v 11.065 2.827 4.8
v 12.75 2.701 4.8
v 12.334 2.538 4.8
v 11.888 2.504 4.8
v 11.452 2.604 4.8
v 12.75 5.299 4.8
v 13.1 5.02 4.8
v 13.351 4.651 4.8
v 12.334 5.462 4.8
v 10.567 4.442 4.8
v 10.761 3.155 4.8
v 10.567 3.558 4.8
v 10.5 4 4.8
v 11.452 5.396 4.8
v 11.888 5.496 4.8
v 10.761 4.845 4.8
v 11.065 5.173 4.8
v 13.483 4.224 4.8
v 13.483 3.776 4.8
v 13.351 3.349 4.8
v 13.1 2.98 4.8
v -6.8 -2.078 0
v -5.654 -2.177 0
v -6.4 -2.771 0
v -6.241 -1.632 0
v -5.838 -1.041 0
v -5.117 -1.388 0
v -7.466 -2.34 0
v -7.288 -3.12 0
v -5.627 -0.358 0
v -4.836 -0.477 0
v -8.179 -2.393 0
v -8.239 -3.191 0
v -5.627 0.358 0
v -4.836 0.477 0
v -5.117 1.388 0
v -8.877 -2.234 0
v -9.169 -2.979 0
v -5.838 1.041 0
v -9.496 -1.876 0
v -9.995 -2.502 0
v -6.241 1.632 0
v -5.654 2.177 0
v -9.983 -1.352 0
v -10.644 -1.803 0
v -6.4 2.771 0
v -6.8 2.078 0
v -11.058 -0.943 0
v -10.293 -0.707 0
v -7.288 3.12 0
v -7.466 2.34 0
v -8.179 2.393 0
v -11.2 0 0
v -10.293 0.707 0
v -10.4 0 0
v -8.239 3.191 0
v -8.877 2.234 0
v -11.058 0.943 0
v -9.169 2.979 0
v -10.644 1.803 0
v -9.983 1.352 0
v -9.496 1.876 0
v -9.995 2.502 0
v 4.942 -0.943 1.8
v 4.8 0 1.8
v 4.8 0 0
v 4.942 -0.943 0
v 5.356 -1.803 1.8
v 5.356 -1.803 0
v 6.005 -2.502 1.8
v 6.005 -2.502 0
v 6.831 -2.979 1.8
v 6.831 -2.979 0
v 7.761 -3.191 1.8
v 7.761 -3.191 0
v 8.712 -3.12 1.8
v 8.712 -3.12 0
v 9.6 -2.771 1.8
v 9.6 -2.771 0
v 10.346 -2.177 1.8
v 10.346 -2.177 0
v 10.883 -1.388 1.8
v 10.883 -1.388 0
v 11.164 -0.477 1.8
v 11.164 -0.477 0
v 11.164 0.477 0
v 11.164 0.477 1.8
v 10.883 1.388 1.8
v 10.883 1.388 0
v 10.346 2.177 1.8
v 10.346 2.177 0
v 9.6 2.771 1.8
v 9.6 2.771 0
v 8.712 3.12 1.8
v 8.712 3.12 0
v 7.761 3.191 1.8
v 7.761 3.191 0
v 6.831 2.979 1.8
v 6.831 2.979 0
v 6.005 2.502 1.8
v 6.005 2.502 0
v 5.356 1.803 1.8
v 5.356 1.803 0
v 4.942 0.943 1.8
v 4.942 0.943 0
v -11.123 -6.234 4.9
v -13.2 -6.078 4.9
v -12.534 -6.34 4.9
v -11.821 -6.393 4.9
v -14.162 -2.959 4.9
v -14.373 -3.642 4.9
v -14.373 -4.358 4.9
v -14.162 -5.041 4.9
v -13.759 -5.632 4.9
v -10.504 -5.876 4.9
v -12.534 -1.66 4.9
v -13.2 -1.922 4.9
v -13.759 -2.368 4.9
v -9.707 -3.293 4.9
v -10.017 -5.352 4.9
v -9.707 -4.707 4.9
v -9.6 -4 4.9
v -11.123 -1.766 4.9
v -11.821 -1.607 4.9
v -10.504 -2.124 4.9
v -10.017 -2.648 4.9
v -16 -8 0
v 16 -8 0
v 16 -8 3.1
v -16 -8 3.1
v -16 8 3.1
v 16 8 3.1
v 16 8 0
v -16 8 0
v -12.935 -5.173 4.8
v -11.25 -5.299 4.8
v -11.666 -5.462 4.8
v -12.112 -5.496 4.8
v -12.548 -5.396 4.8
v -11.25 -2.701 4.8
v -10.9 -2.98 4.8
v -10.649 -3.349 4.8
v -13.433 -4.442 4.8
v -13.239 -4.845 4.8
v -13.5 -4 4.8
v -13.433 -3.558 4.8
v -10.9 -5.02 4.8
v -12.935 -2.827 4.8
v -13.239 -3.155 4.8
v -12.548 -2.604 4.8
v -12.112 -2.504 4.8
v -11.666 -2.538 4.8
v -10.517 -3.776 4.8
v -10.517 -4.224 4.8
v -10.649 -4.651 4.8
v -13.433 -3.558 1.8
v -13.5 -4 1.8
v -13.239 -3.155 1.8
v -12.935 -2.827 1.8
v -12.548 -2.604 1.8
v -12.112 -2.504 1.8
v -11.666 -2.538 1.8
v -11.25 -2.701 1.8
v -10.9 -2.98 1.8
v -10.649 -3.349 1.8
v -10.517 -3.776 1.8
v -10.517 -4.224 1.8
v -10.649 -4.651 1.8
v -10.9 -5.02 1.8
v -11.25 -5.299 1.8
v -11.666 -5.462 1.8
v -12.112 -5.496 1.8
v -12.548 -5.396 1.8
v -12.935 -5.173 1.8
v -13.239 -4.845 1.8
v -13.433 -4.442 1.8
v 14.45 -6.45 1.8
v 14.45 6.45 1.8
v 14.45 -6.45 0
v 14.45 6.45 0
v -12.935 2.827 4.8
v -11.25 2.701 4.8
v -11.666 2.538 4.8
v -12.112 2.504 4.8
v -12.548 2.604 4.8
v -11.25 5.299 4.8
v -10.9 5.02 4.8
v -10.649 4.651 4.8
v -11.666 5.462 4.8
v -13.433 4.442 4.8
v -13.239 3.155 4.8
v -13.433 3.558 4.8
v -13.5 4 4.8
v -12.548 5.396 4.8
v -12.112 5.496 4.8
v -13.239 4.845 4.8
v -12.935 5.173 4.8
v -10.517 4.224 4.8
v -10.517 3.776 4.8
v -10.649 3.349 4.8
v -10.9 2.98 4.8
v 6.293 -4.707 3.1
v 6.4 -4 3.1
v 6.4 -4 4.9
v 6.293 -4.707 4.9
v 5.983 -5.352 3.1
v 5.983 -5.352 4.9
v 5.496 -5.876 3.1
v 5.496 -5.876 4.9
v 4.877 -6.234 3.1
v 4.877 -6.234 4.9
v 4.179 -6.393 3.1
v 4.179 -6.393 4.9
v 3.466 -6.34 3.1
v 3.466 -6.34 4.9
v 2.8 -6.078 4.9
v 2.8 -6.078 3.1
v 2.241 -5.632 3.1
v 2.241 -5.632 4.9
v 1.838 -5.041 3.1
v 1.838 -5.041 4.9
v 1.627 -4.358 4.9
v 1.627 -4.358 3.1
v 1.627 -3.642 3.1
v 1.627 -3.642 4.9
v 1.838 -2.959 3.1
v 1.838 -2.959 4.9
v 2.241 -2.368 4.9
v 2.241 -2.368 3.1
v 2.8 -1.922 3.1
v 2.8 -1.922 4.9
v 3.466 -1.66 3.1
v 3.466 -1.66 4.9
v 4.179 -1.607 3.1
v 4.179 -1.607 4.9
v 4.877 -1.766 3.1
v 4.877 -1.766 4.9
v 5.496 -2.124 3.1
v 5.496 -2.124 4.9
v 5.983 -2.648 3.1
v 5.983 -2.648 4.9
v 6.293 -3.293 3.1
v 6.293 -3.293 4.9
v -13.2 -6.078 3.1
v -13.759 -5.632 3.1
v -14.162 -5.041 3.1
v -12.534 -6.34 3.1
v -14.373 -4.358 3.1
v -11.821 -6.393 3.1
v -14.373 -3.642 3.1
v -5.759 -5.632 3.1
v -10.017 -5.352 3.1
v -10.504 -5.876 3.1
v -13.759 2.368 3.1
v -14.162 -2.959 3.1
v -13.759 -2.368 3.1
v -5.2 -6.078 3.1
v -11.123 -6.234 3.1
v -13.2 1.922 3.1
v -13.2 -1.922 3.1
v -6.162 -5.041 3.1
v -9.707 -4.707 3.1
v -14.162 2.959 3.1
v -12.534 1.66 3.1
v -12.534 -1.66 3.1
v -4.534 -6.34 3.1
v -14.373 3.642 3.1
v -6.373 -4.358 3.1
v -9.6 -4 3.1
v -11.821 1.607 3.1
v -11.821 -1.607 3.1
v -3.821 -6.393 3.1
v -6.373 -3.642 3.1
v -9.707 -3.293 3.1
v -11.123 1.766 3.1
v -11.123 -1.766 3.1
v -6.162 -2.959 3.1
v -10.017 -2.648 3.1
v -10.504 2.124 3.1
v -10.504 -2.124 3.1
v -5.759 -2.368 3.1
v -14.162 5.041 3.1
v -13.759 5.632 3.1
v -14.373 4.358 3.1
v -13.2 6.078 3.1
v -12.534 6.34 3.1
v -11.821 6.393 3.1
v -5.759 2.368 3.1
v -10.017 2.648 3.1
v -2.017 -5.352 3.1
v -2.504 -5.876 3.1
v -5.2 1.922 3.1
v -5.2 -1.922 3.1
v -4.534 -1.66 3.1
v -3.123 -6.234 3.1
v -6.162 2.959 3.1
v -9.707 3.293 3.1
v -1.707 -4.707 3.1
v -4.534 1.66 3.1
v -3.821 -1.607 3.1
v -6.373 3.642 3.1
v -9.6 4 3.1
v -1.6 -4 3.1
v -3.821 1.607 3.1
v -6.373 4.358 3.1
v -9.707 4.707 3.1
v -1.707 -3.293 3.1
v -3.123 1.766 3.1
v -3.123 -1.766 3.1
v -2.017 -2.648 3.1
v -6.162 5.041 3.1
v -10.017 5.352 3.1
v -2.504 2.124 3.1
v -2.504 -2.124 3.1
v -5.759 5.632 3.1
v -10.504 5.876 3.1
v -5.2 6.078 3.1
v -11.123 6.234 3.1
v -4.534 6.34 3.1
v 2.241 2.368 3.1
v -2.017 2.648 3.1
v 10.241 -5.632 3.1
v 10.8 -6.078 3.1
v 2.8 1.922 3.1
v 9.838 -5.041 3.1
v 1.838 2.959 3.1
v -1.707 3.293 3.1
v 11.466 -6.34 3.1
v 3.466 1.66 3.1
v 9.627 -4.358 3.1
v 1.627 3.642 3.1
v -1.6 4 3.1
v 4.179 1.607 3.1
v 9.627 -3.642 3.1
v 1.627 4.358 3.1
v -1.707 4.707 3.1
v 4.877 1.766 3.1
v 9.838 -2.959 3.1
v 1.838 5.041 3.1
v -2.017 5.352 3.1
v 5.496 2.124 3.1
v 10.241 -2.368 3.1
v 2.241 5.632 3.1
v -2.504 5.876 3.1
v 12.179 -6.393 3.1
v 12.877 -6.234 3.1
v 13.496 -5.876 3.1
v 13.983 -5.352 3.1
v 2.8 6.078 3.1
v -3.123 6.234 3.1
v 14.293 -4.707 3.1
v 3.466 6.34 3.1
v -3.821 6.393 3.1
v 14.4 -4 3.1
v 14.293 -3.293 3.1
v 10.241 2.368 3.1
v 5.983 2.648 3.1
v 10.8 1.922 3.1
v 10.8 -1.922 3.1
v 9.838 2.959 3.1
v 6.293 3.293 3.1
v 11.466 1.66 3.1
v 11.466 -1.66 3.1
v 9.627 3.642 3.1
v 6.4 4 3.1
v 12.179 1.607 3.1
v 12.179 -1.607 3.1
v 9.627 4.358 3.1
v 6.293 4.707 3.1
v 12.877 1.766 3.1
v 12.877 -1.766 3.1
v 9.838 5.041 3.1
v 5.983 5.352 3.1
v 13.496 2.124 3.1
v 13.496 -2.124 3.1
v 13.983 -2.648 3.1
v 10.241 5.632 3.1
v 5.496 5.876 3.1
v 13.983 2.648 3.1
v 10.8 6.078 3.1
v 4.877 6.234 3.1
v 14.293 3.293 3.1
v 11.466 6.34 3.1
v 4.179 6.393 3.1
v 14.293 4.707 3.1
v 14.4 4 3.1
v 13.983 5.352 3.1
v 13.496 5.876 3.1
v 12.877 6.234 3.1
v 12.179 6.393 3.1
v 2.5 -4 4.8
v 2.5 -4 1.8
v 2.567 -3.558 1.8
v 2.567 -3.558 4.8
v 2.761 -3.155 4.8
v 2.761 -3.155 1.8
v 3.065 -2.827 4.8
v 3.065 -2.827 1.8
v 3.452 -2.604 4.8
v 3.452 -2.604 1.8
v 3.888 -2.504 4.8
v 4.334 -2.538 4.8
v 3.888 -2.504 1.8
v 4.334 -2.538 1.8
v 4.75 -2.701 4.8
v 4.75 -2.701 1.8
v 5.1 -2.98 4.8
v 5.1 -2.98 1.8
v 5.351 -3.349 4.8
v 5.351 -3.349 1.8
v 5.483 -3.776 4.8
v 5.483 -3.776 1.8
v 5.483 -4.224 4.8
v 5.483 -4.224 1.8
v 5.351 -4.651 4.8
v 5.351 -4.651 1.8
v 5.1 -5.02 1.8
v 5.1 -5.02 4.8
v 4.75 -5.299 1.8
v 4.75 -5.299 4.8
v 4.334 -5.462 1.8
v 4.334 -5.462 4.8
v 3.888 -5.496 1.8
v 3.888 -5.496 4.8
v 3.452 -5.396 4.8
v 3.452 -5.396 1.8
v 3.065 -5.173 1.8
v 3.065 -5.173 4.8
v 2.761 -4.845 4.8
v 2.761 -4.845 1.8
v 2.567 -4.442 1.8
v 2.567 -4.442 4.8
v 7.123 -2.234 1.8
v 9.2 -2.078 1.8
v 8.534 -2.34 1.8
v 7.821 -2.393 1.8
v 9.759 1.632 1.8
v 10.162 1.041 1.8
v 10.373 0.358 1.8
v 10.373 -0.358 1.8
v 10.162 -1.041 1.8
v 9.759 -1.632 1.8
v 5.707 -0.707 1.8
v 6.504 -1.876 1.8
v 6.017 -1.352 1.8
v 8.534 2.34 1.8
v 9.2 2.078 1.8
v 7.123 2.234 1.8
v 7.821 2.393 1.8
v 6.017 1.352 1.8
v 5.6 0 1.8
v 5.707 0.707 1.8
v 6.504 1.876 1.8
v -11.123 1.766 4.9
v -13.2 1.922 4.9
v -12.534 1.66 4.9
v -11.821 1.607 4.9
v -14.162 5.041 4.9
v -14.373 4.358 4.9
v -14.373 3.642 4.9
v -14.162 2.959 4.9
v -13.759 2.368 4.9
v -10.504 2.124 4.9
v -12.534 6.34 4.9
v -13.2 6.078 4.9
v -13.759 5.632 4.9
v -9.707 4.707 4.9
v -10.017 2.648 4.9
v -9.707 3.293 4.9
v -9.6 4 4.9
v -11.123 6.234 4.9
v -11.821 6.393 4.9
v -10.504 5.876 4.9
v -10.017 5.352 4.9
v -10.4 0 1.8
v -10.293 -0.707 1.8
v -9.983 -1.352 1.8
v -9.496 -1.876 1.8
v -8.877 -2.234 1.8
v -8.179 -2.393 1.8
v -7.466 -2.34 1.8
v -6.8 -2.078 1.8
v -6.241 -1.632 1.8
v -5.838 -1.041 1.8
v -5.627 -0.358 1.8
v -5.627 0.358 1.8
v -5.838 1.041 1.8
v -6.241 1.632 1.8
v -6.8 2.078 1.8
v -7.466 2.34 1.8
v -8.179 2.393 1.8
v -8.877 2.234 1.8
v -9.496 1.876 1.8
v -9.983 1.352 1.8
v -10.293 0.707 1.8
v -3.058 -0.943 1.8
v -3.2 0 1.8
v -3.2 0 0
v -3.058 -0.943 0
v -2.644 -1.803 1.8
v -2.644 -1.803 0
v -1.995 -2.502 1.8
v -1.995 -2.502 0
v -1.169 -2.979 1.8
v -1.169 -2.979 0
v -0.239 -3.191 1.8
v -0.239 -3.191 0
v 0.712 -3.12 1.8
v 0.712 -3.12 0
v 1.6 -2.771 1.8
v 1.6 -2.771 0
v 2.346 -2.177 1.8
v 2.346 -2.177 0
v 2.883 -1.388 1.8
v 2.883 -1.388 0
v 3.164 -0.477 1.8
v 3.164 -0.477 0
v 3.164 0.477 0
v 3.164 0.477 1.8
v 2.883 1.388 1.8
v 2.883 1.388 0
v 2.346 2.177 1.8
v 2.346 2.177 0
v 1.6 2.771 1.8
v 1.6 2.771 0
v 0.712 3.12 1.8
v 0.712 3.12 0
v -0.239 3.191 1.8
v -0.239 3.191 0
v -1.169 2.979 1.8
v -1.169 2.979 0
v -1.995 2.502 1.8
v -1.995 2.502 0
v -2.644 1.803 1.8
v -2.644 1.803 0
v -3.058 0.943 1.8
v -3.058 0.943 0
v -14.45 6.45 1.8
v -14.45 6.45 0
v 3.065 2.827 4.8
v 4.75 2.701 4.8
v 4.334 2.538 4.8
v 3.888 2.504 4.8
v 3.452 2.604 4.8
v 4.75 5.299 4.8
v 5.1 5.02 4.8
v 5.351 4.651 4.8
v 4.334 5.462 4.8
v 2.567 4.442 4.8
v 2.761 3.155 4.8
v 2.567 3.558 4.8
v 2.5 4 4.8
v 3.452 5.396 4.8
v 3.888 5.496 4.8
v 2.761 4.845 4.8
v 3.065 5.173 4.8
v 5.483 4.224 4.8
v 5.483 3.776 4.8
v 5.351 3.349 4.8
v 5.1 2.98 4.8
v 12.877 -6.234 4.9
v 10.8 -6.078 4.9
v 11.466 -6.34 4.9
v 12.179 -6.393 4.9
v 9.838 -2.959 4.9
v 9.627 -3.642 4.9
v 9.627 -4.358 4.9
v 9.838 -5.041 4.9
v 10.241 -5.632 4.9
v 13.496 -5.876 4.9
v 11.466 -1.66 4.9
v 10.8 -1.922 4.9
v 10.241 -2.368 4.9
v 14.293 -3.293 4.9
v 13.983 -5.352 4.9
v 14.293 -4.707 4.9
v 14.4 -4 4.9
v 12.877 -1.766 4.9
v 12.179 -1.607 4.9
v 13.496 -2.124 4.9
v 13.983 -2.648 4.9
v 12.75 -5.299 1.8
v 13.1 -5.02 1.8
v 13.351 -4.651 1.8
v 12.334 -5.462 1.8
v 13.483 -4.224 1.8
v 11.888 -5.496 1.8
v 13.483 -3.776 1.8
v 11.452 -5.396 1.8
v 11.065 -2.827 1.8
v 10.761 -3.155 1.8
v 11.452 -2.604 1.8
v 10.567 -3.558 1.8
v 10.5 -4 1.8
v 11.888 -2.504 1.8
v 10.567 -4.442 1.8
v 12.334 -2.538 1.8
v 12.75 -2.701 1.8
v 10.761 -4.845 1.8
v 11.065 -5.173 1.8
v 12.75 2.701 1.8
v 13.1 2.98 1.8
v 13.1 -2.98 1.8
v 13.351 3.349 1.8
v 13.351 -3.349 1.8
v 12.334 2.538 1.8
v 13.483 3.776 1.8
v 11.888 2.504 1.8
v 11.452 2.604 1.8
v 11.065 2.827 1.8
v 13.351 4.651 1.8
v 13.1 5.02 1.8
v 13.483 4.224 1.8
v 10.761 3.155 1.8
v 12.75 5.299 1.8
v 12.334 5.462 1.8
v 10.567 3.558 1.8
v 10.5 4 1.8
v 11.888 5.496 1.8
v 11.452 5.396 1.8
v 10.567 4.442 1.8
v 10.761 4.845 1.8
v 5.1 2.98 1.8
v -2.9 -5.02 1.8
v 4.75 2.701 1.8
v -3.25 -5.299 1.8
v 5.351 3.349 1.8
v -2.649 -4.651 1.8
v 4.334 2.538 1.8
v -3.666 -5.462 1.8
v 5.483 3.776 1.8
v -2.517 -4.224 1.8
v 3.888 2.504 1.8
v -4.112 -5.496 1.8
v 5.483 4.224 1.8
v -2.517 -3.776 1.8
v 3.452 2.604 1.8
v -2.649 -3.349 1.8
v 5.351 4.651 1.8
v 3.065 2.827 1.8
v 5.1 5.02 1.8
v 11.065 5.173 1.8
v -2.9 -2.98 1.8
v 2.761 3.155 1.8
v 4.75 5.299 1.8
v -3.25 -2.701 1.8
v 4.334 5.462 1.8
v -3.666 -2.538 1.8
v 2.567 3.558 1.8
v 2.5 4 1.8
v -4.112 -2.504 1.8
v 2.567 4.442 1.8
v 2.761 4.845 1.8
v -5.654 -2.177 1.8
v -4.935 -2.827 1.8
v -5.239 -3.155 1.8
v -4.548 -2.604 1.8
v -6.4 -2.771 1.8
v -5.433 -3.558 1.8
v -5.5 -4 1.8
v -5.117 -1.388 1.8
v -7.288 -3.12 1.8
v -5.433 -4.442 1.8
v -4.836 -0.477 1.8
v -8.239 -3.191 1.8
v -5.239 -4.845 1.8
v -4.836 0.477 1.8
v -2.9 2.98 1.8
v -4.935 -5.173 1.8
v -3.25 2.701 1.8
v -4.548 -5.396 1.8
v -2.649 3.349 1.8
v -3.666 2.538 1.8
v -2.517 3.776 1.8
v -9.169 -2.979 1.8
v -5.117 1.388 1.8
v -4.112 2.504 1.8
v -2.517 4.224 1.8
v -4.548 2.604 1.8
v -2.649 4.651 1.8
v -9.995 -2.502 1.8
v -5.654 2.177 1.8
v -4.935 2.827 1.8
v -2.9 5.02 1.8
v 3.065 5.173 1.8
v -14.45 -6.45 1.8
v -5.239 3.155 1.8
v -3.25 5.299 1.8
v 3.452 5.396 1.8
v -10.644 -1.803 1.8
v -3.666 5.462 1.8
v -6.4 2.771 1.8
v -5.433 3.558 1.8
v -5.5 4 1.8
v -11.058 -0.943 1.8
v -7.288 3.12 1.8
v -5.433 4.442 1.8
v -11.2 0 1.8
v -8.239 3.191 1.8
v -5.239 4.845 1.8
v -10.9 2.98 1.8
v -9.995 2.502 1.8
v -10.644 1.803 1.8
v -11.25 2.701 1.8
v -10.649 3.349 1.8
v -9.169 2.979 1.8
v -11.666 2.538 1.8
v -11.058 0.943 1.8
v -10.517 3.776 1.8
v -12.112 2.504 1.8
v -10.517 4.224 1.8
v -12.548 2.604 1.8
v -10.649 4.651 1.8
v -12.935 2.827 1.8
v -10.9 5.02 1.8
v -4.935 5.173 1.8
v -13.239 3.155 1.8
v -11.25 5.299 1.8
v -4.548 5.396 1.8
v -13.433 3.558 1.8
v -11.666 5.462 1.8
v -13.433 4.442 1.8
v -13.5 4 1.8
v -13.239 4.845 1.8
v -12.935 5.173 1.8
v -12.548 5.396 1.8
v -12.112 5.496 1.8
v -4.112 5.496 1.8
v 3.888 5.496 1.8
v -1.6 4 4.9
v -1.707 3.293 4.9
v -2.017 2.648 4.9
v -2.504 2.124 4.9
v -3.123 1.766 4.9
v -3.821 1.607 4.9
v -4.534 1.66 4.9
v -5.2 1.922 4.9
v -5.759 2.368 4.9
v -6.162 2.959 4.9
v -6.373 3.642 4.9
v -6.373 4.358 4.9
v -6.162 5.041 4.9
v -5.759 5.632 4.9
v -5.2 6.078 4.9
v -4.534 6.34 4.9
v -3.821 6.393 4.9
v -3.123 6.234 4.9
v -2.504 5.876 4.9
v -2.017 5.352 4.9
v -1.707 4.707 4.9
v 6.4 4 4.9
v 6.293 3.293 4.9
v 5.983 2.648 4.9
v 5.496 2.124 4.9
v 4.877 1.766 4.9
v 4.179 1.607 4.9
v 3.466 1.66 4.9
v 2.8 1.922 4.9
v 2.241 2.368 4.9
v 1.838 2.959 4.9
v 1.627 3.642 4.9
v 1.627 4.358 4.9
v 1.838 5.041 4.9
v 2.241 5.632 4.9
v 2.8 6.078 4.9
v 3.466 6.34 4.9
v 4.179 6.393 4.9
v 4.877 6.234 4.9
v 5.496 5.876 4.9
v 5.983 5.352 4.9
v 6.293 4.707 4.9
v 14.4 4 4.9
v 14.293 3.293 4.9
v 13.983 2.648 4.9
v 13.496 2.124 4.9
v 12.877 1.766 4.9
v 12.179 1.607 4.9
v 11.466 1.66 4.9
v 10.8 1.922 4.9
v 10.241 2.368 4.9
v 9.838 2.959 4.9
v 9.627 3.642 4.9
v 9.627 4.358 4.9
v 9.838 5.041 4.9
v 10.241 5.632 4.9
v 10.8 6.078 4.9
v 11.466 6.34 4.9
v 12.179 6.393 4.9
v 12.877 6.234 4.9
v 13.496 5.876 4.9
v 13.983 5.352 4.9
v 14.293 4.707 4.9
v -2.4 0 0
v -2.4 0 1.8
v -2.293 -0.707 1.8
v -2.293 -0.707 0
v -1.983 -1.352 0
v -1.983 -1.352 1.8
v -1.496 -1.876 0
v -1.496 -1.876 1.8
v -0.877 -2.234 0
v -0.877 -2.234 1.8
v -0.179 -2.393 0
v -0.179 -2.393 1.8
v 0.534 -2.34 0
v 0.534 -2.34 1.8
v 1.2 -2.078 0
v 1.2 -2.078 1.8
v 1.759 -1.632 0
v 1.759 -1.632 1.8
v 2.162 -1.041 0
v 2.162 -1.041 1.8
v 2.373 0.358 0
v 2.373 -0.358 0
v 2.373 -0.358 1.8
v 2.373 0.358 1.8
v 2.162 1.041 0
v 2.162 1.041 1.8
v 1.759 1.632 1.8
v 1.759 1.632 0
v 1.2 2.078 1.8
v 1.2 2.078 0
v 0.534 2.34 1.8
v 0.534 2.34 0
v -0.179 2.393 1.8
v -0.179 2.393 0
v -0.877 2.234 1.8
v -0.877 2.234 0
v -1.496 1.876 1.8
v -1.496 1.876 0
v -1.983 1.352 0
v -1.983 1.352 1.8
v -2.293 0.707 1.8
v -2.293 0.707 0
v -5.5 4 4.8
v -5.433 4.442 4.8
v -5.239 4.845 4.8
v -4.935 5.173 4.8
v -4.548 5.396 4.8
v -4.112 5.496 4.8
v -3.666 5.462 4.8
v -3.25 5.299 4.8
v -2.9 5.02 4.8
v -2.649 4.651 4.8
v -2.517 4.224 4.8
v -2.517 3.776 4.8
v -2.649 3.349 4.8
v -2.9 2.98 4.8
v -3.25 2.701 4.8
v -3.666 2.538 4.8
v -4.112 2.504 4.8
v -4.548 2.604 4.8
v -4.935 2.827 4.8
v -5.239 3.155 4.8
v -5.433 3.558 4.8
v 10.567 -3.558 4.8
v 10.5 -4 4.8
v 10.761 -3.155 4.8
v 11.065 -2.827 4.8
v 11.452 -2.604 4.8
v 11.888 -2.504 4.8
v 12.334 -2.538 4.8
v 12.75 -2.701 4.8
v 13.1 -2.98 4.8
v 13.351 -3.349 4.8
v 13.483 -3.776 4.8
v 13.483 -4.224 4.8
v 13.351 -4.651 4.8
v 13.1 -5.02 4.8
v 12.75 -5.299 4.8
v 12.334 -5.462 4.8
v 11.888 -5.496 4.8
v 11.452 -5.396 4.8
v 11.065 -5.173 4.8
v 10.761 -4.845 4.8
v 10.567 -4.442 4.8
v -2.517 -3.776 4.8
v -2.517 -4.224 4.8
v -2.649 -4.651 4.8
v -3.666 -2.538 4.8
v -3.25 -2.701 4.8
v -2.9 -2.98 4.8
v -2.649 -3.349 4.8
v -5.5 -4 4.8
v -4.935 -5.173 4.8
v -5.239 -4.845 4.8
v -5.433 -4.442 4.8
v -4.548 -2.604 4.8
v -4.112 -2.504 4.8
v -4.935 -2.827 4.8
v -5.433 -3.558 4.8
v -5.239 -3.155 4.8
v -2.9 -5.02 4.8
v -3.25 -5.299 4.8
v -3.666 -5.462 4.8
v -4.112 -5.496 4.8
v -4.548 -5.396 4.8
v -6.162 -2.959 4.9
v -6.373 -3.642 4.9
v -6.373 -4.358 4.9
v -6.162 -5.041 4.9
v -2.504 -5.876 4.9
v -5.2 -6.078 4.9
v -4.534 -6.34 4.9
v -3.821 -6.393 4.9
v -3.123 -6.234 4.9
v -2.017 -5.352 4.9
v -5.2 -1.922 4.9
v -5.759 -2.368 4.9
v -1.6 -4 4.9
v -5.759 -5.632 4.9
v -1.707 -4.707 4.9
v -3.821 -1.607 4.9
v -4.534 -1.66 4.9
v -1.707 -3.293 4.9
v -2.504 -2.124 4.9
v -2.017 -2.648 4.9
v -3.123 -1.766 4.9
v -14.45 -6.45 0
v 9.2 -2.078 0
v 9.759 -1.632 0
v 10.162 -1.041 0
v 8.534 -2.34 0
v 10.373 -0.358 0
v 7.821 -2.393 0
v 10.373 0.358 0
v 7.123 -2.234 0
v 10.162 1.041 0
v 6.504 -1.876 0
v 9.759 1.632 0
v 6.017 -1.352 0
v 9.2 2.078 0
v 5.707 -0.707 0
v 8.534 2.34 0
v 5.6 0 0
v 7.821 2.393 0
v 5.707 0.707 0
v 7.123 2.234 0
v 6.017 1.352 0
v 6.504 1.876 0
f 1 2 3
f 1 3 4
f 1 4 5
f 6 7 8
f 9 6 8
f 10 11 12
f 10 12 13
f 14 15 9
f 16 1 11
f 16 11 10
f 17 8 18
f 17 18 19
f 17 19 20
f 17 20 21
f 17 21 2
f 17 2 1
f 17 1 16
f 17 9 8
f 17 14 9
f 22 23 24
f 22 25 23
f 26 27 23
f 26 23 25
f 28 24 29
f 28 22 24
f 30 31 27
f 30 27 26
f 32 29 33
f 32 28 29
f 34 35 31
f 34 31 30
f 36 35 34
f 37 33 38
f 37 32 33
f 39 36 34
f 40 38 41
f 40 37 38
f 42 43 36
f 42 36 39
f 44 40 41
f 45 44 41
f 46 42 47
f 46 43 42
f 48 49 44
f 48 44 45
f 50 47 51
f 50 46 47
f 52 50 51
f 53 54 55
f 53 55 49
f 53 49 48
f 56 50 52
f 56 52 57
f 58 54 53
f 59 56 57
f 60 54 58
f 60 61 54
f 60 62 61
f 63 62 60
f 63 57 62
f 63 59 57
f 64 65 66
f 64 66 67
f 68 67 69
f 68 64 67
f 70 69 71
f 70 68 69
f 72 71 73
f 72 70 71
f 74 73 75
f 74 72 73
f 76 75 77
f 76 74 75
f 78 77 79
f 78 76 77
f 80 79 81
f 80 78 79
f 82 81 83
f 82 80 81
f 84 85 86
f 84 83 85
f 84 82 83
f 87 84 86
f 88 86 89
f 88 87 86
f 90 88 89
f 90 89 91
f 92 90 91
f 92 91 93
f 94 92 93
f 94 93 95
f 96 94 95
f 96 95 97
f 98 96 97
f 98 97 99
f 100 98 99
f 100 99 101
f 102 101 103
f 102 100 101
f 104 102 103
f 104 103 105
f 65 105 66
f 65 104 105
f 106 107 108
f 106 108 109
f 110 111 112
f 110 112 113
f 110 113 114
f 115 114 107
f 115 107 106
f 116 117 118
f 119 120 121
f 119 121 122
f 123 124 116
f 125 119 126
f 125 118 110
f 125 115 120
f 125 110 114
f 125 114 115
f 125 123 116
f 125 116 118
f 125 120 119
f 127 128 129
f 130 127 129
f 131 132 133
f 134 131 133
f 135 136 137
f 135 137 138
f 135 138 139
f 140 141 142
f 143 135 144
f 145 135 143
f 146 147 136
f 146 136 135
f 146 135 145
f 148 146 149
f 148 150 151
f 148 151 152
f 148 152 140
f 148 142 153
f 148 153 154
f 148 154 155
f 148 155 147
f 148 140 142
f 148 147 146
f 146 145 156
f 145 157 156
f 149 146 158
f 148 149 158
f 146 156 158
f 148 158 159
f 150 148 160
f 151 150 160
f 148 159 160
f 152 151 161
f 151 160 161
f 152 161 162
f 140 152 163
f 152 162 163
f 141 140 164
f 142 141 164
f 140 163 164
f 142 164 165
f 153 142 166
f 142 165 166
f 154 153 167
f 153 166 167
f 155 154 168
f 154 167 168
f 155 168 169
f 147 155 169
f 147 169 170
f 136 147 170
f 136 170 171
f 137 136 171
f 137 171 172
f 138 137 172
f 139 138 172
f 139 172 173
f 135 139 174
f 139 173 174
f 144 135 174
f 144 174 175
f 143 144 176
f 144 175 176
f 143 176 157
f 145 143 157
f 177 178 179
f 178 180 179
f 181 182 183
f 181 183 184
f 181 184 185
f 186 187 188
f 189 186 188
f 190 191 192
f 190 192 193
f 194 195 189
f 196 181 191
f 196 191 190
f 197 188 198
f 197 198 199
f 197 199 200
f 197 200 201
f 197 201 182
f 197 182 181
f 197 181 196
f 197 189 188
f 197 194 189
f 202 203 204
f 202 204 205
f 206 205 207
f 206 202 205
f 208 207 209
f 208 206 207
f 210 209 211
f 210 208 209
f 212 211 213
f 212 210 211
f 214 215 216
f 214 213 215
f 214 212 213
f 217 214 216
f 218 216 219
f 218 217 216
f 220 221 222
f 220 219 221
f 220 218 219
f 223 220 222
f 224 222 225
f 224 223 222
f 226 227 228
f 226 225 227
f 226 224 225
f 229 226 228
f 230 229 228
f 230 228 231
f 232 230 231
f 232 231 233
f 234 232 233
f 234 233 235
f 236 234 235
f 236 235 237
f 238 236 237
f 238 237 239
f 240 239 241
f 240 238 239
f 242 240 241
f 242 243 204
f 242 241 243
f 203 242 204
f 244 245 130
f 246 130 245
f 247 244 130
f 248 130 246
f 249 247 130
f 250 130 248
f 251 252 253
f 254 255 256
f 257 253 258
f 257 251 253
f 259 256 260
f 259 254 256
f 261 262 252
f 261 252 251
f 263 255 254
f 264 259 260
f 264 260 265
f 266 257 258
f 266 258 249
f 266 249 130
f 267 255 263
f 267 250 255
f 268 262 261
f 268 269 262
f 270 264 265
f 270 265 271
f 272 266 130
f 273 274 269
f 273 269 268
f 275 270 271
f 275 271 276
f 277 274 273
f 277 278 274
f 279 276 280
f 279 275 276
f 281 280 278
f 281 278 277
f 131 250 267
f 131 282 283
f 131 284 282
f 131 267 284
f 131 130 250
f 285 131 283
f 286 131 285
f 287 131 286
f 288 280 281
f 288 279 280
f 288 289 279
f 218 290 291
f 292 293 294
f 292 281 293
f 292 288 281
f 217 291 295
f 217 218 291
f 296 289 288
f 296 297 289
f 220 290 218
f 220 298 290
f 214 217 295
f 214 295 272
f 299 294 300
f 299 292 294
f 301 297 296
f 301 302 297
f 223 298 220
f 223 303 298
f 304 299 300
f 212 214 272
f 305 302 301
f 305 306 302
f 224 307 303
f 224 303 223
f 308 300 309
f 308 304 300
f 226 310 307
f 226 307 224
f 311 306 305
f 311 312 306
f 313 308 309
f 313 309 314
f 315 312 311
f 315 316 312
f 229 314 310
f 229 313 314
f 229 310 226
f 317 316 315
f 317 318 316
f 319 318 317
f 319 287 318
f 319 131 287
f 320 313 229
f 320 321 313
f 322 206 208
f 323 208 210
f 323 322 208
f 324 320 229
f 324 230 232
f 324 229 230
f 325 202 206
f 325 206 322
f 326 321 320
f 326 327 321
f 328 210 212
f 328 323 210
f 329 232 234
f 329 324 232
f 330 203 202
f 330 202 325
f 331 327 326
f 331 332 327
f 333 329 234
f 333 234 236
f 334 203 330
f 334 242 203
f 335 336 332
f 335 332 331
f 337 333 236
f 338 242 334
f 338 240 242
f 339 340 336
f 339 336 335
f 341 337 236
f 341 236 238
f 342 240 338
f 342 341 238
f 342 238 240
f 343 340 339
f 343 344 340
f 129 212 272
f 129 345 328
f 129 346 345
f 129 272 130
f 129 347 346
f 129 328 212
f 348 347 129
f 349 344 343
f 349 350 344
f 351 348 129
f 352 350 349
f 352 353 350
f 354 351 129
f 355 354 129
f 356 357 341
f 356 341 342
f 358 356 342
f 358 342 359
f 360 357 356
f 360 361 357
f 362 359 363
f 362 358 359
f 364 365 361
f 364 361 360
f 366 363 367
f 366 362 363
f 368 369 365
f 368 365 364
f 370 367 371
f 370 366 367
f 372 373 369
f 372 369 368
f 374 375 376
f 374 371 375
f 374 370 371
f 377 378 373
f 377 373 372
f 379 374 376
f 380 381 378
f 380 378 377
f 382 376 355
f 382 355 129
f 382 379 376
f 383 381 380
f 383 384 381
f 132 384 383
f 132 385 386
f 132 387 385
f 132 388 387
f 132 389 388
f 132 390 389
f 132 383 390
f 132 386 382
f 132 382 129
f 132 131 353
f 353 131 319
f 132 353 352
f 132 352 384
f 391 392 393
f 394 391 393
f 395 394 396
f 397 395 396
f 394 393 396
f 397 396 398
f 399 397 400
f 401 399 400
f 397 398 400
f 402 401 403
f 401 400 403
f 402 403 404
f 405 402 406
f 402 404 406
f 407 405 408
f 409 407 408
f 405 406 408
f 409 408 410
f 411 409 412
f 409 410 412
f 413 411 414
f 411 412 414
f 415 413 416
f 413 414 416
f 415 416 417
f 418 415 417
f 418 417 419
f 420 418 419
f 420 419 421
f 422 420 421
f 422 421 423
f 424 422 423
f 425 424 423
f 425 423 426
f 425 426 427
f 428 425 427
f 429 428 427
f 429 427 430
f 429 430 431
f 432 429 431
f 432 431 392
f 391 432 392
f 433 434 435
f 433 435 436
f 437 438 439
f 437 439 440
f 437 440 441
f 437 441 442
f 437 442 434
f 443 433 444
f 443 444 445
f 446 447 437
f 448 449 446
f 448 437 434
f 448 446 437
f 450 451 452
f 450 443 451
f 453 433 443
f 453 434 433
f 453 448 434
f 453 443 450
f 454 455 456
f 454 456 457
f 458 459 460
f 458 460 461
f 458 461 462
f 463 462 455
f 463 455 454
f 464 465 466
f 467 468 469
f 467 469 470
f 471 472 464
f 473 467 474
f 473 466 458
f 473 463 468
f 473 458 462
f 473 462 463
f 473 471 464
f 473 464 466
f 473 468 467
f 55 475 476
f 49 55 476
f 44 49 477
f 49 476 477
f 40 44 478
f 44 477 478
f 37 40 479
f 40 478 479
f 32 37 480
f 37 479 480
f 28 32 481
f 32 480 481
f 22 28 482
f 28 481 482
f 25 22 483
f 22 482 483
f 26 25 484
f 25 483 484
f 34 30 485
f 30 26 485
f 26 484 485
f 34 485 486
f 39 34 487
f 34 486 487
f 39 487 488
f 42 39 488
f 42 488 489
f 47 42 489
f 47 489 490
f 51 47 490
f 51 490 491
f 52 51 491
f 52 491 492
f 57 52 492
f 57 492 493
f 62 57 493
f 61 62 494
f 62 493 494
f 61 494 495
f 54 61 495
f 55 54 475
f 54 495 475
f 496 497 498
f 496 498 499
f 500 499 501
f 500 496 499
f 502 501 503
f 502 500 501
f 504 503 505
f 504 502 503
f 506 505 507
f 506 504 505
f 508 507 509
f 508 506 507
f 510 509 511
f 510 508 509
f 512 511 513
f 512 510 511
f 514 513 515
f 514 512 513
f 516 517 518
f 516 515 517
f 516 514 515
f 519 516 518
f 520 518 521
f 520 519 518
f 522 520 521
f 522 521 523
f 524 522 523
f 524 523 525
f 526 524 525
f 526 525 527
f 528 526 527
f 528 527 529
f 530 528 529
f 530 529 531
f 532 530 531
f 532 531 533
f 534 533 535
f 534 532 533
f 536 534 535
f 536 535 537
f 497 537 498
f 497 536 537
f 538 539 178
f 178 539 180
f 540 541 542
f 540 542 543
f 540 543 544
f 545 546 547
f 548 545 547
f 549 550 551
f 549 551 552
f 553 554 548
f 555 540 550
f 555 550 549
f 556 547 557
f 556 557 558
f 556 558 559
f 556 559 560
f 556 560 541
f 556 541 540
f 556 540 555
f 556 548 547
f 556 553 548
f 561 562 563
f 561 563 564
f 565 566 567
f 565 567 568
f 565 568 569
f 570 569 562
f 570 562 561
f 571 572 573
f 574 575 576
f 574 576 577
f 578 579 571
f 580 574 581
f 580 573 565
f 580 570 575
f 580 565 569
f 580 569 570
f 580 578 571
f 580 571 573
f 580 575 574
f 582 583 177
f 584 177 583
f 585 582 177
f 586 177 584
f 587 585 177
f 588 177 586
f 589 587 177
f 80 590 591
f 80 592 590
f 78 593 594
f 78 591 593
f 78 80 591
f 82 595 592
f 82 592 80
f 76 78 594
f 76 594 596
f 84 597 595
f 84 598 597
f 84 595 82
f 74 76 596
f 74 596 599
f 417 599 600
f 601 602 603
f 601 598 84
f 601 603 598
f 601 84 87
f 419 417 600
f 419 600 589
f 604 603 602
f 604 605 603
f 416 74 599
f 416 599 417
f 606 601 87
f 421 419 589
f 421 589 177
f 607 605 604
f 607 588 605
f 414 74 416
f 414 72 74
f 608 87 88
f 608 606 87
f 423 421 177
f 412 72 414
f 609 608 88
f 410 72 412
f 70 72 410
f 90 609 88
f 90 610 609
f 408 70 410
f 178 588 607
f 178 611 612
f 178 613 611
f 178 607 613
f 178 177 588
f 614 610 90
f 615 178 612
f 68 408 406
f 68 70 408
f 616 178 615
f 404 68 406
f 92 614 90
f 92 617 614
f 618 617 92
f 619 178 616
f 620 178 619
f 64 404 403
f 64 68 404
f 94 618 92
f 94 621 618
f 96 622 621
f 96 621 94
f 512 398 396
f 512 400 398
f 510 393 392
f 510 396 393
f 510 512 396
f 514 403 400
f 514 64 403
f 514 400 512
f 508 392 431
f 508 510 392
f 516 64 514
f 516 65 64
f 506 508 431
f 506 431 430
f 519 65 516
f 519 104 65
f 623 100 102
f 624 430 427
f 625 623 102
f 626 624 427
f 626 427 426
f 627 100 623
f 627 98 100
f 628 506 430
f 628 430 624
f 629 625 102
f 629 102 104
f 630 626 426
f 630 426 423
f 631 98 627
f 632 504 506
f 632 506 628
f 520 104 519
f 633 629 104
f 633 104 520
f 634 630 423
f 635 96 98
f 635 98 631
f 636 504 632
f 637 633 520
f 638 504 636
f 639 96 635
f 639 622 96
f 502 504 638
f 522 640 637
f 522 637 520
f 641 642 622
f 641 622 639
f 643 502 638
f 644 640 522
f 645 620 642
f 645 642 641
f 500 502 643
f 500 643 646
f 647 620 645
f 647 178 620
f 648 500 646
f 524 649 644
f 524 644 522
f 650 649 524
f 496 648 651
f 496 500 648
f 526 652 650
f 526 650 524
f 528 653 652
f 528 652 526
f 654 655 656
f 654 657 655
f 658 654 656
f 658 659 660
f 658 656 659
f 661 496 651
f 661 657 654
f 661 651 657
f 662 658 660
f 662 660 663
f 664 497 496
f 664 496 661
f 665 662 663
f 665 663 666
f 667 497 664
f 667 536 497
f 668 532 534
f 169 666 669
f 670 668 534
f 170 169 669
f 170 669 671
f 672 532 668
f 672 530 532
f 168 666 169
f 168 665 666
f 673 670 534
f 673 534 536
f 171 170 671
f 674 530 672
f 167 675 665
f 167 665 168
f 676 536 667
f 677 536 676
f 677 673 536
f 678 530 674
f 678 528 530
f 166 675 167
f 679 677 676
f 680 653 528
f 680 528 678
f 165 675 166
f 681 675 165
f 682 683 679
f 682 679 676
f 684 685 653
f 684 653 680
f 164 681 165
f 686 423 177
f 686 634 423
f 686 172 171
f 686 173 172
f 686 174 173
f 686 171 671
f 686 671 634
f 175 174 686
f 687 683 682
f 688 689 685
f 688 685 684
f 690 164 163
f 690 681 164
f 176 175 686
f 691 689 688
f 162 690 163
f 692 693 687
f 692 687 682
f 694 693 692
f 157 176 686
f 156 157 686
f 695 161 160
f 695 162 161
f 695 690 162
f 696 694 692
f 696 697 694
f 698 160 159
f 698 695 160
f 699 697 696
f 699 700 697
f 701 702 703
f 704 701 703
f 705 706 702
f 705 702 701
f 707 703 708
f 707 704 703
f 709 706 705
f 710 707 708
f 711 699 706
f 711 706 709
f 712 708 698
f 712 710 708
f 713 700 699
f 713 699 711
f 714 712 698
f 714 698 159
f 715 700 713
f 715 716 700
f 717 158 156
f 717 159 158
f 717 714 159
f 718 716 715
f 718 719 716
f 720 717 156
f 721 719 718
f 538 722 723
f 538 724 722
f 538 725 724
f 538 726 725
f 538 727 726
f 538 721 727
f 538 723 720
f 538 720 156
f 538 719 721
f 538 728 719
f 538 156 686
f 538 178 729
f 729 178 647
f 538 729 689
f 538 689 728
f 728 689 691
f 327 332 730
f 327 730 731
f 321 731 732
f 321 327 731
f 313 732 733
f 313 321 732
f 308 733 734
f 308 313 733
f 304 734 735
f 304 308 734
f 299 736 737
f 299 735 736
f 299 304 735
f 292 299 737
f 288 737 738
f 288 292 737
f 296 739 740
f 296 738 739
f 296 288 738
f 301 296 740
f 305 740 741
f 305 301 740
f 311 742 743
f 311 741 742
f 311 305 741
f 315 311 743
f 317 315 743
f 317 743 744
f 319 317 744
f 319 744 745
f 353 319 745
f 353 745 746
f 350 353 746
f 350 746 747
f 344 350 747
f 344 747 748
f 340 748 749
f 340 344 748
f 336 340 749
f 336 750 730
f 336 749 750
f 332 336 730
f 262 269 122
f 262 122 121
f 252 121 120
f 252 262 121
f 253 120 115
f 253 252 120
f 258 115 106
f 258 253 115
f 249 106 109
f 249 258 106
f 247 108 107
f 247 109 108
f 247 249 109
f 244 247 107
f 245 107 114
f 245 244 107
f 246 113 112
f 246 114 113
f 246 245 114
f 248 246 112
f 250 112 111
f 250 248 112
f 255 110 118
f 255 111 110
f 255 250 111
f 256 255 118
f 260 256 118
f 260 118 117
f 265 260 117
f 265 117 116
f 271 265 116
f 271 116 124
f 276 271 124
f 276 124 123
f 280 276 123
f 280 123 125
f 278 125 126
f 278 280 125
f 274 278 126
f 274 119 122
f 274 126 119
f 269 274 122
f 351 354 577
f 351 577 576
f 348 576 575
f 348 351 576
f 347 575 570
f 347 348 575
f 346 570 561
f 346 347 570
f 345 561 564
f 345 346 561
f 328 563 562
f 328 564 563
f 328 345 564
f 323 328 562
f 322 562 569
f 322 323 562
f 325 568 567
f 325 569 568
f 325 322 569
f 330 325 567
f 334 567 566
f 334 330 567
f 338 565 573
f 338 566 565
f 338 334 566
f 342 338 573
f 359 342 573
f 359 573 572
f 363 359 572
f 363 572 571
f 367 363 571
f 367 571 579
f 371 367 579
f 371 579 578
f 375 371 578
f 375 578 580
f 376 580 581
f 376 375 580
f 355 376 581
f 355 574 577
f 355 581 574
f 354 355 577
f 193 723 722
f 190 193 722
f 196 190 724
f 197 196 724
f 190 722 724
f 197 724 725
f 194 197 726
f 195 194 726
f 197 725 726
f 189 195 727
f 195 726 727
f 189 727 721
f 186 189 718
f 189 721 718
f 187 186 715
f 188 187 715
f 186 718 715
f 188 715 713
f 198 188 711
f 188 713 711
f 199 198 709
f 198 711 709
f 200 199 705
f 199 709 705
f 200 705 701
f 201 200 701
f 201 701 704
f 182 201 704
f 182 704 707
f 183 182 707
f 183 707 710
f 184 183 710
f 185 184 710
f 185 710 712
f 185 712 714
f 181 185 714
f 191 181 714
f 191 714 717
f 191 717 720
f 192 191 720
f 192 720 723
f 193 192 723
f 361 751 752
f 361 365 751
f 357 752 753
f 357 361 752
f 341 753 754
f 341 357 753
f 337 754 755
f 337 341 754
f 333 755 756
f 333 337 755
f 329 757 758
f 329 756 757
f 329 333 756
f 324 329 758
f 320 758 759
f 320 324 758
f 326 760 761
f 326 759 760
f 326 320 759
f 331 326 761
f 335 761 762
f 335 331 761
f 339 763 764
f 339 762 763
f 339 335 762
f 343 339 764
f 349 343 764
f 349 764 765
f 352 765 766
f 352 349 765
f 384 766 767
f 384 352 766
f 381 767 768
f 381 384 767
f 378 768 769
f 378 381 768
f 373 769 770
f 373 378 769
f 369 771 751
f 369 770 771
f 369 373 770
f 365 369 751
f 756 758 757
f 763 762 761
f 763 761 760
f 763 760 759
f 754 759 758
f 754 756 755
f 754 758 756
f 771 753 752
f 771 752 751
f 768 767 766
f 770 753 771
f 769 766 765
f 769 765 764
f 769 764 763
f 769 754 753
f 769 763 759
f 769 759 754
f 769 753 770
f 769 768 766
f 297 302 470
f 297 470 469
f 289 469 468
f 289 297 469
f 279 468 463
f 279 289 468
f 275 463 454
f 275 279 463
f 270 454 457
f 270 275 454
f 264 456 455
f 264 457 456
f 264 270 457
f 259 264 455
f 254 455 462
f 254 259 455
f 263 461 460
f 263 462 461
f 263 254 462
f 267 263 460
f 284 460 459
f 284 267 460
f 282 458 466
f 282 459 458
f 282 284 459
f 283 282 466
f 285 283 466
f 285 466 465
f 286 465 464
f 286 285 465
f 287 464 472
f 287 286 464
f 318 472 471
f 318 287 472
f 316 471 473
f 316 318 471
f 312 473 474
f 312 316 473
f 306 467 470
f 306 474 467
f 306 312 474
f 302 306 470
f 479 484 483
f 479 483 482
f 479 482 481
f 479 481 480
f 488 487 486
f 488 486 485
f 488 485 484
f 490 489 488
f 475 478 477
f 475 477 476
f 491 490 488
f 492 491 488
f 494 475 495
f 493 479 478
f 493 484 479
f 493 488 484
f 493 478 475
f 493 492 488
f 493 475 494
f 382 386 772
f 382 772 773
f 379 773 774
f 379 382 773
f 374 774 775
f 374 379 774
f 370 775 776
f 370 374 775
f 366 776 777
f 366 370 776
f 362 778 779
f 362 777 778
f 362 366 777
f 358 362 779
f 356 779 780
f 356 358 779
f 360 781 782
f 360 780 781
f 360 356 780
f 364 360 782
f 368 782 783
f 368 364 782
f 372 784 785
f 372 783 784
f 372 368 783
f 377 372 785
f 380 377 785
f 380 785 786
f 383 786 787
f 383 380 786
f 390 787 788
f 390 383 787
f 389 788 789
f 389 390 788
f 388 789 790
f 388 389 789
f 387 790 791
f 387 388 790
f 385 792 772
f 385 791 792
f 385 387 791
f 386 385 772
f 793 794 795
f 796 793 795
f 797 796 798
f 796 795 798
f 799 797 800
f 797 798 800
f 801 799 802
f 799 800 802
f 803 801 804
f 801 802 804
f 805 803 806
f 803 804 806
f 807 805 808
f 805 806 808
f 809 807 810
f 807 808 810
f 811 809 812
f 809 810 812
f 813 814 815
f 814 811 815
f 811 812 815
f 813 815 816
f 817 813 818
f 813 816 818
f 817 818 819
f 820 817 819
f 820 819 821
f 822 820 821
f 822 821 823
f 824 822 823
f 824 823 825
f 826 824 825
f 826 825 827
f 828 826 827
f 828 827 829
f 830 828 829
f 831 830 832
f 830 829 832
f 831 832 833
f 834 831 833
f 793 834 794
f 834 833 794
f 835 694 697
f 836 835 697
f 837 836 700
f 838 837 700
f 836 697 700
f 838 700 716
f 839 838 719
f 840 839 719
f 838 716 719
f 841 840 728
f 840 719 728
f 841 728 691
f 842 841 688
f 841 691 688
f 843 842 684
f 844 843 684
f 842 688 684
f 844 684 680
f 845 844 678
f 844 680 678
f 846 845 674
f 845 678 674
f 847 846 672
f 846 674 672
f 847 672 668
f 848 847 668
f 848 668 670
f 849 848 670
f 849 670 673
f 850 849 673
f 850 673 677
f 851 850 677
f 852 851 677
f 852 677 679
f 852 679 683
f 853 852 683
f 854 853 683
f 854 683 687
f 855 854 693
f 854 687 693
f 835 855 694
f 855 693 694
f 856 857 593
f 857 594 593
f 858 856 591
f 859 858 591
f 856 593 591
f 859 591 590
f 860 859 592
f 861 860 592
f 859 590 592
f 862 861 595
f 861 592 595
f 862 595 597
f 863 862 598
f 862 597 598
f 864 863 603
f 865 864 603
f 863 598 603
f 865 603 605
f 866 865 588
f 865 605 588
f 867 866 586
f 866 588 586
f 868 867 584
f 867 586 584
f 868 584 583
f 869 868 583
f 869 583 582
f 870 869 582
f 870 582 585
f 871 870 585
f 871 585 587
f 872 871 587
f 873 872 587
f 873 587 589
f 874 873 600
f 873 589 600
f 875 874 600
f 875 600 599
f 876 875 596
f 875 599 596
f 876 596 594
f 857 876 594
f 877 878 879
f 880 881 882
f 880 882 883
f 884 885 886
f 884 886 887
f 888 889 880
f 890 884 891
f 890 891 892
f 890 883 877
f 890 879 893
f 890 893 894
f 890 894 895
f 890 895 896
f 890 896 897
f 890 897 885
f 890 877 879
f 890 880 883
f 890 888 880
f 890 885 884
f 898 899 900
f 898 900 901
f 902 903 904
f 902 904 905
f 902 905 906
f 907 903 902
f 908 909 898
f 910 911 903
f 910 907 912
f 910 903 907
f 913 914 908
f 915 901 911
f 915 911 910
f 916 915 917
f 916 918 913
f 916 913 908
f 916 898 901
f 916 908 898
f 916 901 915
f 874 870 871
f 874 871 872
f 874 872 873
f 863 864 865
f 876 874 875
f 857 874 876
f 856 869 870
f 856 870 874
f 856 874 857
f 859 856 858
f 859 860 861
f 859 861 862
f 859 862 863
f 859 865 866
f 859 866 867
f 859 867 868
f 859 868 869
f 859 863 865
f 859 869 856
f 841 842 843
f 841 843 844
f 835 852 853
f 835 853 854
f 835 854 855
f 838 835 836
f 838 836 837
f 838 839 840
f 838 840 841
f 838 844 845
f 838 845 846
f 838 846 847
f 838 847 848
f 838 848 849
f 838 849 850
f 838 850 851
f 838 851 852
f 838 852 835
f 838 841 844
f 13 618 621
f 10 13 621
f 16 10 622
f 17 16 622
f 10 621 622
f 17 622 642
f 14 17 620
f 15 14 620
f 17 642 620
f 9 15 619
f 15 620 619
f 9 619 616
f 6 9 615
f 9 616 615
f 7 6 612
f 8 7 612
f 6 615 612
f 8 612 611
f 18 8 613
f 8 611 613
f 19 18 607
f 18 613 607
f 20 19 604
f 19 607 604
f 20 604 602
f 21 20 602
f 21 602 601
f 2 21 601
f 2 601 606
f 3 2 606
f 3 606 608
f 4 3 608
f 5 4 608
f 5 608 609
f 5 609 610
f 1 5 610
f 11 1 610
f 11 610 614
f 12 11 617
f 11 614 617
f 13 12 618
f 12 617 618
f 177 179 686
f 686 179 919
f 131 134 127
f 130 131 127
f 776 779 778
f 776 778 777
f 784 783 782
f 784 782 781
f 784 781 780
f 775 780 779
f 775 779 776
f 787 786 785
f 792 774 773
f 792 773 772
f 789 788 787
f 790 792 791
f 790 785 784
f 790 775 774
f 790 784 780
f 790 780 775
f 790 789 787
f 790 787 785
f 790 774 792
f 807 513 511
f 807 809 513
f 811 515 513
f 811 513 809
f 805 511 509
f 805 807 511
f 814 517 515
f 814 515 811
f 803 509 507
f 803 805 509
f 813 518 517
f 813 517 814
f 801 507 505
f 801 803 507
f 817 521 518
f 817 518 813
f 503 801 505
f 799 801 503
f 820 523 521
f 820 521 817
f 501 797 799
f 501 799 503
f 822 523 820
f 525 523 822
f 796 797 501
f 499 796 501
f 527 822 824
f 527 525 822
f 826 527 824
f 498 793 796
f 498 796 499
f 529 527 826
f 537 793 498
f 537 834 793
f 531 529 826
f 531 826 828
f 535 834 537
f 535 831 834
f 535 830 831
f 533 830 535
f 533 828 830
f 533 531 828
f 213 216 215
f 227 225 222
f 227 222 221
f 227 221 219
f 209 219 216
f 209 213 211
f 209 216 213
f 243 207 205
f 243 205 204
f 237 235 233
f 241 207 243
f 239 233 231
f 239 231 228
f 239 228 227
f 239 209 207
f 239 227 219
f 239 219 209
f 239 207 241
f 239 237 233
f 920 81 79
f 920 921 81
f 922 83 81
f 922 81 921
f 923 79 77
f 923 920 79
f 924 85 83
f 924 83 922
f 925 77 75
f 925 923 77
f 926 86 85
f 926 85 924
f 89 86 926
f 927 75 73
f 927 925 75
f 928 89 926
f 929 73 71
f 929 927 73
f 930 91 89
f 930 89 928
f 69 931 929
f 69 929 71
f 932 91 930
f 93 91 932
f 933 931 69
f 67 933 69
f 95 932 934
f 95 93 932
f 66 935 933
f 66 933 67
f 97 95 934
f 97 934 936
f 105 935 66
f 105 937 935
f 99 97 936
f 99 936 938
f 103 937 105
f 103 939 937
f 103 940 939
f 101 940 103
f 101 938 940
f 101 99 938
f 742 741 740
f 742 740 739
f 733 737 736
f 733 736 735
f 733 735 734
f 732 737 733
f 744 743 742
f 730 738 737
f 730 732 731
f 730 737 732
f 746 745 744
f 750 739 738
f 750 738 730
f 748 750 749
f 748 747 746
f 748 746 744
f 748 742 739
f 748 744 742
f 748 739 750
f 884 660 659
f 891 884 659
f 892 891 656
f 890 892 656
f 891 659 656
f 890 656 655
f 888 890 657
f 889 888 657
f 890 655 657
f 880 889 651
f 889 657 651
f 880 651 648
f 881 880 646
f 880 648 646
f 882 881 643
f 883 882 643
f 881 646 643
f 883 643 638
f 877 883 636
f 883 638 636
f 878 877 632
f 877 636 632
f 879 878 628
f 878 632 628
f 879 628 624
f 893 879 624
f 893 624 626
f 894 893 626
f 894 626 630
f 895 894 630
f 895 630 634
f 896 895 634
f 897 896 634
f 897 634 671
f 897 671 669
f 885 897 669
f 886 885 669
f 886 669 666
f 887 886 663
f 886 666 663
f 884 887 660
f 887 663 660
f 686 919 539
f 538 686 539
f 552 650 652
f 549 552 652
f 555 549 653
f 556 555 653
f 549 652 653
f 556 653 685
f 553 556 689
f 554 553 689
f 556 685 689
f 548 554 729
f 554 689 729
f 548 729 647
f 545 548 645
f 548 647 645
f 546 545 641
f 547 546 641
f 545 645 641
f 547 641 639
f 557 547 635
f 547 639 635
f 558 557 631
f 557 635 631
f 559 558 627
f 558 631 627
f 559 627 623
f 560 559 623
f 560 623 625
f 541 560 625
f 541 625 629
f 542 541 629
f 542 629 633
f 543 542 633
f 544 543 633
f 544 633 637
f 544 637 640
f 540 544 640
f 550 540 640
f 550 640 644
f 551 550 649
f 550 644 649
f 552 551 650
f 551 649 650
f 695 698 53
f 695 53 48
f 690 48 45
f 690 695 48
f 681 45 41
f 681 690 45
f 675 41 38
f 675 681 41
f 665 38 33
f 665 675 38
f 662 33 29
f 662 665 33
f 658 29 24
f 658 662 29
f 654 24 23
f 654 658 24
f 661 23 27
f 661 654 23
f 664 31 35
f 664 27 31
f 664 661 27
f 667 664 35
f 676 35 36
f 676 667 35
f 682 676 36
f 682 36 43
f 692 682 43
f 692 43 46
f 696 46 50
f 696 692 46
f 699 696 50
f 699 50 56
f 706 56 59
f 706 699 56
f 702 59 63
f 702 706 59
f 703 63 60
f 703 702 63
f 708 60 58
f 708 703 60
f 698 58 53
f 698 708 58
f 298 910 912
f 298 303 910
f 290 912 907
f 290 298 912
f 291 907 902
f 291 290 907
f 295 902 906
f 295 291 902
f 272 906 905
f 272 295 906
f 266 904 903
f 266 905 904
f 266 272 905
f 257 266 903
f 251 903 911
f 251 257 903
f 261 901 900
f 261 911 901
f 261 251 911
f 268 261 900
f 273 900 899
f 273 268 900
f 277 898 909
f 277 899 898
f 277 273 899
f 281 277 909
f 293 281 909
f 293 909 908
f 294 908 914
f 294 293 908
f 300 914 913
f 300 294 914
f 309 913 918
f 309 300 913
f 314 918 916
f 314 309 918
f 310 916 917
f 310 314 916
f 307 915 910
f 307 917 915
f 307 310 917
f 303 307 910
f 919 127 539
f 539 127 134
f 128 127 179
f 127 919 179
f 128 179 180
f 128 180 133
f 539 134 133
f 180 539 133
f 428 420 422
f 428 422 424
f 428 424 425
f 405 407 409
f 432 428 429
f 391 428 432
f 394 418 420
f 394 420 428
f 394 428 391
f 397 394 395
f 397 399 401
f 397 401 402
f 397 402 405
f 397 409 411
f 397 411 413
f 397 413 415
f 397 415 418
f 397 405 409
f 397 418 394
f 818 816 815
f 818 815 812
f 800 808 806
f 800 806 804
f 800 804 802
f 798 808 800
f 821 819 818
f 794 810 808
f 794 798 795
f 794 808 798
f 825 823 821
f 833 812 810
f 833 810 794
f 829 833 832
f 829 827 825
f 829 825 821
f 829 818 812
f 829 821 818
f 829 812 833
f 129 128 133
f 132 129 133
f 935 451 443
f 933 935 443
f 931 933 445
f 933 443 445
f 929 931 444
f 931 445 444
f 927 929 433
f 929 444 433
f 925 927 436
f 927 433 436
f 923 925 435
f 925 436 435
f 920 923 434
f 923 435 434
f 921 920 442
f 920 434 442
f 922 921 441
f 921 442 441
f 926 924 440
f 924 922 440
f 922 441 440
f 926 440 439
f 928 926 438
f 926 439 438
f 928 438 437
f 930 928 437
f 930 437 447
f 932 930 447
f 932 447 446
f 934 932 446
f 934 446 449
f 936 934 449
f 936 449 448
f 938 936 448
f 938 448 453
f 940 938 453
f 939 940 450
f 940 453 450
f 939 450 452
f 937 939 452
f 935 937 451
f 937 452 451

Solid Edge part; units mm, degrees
sketch "Sketch1" plane through (0, 0, 0) normal (0, 0, 1) x (1, 0, 0)
  line L0 (-16, -7.9) -> (16, -7.9)
  line L1 (16, -7.9) -> (16, 7.9)
  line L2 (16, 7.9) -> (-16, 7.9)
  line L3 (-16, 7.9) -> (-16, -7.9)
  dimension "D1" = 32
  dimension "D2" = 15.8
extrude "Protrusion1" add sketch "Sketch1" along normal blind 3.1
sketch "Sketch2" plane through (0, 0, 0) normal (0, 0, -1) x (1, 0, 0)
  line L0 (-14.45, -6.45) -> (14.45, -6.45)
  line L1 (14.45, -6.45) -> (14.45, 6.45)
  line L2 (14.45, 6.45) -> (-14.45, 6.45)
  line L3 (-14.45, 6.45) -> (-14.45, -6.45)
extrude "ExtrudedCutout_2" cut sketch "Sketch2" against normal blind 1.8
sketch "Sketch3" plane through (0, 0, 3.1) normal (0, 0, 1) x (1, 0, 0)
  circle A0 centre (-4, 4) radius 2.4
  circle A1 centre (4, 4) radius 2.4
  circle A2 centre (12, 4) radius 2.4
  circle A3 centre (12, -4) radius 2.4
  circle A4 centre (4, -4) radius 2.4
  circle A5 centre (-4, -4) radius 2.4
  circle A6 centre (-12, -4) radius 2.4
  circle A7 centre (-12, 4) radius 2.4
  dimension "D1" = 4.8
  dimension "D2" = 4.8
  dimension "D3" = 4.8
  dimension "D4" = 4.8
  dimension "D5" = 4.8
  dimension "D6" = 4.8
  dimension "D7" = 4.8
  dimension "D8" = 4.8
  dimension "D9" = 4
  dimension "D10" = 8
  dimension "D11" = 8
  dimension "D12" = 8
  dimension "D13" = 4
  dimension "D14" = 4
  dimension "D15" = 8
  dimension "D16" = 8
  dimension "D17" = 8
  dimension "D18" = 4
extrude "ExtrudedProtrusion_4" add sketch "Sketch3" along normal blind 1.8
sketch "Sketch4" plane through (0, 0, 0) normal (0, 0, -1) x (-1, 0, 0)
  circle A0 centre (12, 4) radius 1.5
  circle A1 centre (12, -4) radius 1.5
  circle A2 centre (4, -4) radius 1.5
  circle A3 centre (4, 4) radius 1.5
  circle A4 centre (-4, 4) radius 1.5
  circle A5 centre (-4, -4) radius 1.5
  circle A6 centre (-12, -4) radius 1.5
  circle A7 centre (-12, 4) radius 1.5
  dimension "D1" = 3
  dimension "D2" = 3
  dimension "D3" = 3
  dimension "D4" = 3
  dimension "D5" = 3
  dimension "D6" = 3
  dimension "D7" = 3
  dimension "D8" = 3
extrude "ExtrudedCutout_4" cut sketch "Sketch4" against normal blind 4.8
sketch "Sketch5" plane through (0, 0, 1.8) normal (0, 0, -1) x (-1, 0, 0)
  circle A0 centre (-8, 0) radius 3.2
  circle A1 centre (0, 0) radius 3.2
  circle A2 centre (8, 0) radius 3.2
  circle A3 centre (8, 0) radius 2.4
  circle A4 centre (0, 0) radius 2.4
  circle A5 centre (-8, 0) radius 2.4
  dimension "D1" = 6.4
  dimension "D2" = 6.4
  dimension "D3" = 6.4
  dimension "D4" = 4.8
  dimension "D5" = 4.8
  dimension "D6" = 4.8
extrude "Protrusion2" add sketch "Sketch5" along normal blind 1.8
sketch "Sketch6" plane through (0, -7.9, 1.55) normal (0, -1, 0) x (1, 0, 0)
  line L0 (-16, -1.55) -> (-16, 1.55)
  line L1 (-16, 1.55) -> (16, 1.55)
  line L2 (16, 1.55) -> (16, -1.55)
  line L3 (16, -1.55) -> (-16, -1.55)
extrude "ExtrudedProtrusion_9" add sketch "Sketch6" along normal blind 0.1
sketch "Sketch7" plane through (0, 7.9, 1.55) normal (0, 1, 0) x (-1, 0, 0)
  line L0 (-16, -1.55) -> (-16, 1.55)
  line L1 (-16, 1.55) -> (16, 1.55)
  line L2 (16, 1.55) -> (16, -1.55)
  line L3 (16, -1.55) -> (-16, -1.55)
extrude "Protrusion3" add sketch "Sketch7" along normal blind 0.1
